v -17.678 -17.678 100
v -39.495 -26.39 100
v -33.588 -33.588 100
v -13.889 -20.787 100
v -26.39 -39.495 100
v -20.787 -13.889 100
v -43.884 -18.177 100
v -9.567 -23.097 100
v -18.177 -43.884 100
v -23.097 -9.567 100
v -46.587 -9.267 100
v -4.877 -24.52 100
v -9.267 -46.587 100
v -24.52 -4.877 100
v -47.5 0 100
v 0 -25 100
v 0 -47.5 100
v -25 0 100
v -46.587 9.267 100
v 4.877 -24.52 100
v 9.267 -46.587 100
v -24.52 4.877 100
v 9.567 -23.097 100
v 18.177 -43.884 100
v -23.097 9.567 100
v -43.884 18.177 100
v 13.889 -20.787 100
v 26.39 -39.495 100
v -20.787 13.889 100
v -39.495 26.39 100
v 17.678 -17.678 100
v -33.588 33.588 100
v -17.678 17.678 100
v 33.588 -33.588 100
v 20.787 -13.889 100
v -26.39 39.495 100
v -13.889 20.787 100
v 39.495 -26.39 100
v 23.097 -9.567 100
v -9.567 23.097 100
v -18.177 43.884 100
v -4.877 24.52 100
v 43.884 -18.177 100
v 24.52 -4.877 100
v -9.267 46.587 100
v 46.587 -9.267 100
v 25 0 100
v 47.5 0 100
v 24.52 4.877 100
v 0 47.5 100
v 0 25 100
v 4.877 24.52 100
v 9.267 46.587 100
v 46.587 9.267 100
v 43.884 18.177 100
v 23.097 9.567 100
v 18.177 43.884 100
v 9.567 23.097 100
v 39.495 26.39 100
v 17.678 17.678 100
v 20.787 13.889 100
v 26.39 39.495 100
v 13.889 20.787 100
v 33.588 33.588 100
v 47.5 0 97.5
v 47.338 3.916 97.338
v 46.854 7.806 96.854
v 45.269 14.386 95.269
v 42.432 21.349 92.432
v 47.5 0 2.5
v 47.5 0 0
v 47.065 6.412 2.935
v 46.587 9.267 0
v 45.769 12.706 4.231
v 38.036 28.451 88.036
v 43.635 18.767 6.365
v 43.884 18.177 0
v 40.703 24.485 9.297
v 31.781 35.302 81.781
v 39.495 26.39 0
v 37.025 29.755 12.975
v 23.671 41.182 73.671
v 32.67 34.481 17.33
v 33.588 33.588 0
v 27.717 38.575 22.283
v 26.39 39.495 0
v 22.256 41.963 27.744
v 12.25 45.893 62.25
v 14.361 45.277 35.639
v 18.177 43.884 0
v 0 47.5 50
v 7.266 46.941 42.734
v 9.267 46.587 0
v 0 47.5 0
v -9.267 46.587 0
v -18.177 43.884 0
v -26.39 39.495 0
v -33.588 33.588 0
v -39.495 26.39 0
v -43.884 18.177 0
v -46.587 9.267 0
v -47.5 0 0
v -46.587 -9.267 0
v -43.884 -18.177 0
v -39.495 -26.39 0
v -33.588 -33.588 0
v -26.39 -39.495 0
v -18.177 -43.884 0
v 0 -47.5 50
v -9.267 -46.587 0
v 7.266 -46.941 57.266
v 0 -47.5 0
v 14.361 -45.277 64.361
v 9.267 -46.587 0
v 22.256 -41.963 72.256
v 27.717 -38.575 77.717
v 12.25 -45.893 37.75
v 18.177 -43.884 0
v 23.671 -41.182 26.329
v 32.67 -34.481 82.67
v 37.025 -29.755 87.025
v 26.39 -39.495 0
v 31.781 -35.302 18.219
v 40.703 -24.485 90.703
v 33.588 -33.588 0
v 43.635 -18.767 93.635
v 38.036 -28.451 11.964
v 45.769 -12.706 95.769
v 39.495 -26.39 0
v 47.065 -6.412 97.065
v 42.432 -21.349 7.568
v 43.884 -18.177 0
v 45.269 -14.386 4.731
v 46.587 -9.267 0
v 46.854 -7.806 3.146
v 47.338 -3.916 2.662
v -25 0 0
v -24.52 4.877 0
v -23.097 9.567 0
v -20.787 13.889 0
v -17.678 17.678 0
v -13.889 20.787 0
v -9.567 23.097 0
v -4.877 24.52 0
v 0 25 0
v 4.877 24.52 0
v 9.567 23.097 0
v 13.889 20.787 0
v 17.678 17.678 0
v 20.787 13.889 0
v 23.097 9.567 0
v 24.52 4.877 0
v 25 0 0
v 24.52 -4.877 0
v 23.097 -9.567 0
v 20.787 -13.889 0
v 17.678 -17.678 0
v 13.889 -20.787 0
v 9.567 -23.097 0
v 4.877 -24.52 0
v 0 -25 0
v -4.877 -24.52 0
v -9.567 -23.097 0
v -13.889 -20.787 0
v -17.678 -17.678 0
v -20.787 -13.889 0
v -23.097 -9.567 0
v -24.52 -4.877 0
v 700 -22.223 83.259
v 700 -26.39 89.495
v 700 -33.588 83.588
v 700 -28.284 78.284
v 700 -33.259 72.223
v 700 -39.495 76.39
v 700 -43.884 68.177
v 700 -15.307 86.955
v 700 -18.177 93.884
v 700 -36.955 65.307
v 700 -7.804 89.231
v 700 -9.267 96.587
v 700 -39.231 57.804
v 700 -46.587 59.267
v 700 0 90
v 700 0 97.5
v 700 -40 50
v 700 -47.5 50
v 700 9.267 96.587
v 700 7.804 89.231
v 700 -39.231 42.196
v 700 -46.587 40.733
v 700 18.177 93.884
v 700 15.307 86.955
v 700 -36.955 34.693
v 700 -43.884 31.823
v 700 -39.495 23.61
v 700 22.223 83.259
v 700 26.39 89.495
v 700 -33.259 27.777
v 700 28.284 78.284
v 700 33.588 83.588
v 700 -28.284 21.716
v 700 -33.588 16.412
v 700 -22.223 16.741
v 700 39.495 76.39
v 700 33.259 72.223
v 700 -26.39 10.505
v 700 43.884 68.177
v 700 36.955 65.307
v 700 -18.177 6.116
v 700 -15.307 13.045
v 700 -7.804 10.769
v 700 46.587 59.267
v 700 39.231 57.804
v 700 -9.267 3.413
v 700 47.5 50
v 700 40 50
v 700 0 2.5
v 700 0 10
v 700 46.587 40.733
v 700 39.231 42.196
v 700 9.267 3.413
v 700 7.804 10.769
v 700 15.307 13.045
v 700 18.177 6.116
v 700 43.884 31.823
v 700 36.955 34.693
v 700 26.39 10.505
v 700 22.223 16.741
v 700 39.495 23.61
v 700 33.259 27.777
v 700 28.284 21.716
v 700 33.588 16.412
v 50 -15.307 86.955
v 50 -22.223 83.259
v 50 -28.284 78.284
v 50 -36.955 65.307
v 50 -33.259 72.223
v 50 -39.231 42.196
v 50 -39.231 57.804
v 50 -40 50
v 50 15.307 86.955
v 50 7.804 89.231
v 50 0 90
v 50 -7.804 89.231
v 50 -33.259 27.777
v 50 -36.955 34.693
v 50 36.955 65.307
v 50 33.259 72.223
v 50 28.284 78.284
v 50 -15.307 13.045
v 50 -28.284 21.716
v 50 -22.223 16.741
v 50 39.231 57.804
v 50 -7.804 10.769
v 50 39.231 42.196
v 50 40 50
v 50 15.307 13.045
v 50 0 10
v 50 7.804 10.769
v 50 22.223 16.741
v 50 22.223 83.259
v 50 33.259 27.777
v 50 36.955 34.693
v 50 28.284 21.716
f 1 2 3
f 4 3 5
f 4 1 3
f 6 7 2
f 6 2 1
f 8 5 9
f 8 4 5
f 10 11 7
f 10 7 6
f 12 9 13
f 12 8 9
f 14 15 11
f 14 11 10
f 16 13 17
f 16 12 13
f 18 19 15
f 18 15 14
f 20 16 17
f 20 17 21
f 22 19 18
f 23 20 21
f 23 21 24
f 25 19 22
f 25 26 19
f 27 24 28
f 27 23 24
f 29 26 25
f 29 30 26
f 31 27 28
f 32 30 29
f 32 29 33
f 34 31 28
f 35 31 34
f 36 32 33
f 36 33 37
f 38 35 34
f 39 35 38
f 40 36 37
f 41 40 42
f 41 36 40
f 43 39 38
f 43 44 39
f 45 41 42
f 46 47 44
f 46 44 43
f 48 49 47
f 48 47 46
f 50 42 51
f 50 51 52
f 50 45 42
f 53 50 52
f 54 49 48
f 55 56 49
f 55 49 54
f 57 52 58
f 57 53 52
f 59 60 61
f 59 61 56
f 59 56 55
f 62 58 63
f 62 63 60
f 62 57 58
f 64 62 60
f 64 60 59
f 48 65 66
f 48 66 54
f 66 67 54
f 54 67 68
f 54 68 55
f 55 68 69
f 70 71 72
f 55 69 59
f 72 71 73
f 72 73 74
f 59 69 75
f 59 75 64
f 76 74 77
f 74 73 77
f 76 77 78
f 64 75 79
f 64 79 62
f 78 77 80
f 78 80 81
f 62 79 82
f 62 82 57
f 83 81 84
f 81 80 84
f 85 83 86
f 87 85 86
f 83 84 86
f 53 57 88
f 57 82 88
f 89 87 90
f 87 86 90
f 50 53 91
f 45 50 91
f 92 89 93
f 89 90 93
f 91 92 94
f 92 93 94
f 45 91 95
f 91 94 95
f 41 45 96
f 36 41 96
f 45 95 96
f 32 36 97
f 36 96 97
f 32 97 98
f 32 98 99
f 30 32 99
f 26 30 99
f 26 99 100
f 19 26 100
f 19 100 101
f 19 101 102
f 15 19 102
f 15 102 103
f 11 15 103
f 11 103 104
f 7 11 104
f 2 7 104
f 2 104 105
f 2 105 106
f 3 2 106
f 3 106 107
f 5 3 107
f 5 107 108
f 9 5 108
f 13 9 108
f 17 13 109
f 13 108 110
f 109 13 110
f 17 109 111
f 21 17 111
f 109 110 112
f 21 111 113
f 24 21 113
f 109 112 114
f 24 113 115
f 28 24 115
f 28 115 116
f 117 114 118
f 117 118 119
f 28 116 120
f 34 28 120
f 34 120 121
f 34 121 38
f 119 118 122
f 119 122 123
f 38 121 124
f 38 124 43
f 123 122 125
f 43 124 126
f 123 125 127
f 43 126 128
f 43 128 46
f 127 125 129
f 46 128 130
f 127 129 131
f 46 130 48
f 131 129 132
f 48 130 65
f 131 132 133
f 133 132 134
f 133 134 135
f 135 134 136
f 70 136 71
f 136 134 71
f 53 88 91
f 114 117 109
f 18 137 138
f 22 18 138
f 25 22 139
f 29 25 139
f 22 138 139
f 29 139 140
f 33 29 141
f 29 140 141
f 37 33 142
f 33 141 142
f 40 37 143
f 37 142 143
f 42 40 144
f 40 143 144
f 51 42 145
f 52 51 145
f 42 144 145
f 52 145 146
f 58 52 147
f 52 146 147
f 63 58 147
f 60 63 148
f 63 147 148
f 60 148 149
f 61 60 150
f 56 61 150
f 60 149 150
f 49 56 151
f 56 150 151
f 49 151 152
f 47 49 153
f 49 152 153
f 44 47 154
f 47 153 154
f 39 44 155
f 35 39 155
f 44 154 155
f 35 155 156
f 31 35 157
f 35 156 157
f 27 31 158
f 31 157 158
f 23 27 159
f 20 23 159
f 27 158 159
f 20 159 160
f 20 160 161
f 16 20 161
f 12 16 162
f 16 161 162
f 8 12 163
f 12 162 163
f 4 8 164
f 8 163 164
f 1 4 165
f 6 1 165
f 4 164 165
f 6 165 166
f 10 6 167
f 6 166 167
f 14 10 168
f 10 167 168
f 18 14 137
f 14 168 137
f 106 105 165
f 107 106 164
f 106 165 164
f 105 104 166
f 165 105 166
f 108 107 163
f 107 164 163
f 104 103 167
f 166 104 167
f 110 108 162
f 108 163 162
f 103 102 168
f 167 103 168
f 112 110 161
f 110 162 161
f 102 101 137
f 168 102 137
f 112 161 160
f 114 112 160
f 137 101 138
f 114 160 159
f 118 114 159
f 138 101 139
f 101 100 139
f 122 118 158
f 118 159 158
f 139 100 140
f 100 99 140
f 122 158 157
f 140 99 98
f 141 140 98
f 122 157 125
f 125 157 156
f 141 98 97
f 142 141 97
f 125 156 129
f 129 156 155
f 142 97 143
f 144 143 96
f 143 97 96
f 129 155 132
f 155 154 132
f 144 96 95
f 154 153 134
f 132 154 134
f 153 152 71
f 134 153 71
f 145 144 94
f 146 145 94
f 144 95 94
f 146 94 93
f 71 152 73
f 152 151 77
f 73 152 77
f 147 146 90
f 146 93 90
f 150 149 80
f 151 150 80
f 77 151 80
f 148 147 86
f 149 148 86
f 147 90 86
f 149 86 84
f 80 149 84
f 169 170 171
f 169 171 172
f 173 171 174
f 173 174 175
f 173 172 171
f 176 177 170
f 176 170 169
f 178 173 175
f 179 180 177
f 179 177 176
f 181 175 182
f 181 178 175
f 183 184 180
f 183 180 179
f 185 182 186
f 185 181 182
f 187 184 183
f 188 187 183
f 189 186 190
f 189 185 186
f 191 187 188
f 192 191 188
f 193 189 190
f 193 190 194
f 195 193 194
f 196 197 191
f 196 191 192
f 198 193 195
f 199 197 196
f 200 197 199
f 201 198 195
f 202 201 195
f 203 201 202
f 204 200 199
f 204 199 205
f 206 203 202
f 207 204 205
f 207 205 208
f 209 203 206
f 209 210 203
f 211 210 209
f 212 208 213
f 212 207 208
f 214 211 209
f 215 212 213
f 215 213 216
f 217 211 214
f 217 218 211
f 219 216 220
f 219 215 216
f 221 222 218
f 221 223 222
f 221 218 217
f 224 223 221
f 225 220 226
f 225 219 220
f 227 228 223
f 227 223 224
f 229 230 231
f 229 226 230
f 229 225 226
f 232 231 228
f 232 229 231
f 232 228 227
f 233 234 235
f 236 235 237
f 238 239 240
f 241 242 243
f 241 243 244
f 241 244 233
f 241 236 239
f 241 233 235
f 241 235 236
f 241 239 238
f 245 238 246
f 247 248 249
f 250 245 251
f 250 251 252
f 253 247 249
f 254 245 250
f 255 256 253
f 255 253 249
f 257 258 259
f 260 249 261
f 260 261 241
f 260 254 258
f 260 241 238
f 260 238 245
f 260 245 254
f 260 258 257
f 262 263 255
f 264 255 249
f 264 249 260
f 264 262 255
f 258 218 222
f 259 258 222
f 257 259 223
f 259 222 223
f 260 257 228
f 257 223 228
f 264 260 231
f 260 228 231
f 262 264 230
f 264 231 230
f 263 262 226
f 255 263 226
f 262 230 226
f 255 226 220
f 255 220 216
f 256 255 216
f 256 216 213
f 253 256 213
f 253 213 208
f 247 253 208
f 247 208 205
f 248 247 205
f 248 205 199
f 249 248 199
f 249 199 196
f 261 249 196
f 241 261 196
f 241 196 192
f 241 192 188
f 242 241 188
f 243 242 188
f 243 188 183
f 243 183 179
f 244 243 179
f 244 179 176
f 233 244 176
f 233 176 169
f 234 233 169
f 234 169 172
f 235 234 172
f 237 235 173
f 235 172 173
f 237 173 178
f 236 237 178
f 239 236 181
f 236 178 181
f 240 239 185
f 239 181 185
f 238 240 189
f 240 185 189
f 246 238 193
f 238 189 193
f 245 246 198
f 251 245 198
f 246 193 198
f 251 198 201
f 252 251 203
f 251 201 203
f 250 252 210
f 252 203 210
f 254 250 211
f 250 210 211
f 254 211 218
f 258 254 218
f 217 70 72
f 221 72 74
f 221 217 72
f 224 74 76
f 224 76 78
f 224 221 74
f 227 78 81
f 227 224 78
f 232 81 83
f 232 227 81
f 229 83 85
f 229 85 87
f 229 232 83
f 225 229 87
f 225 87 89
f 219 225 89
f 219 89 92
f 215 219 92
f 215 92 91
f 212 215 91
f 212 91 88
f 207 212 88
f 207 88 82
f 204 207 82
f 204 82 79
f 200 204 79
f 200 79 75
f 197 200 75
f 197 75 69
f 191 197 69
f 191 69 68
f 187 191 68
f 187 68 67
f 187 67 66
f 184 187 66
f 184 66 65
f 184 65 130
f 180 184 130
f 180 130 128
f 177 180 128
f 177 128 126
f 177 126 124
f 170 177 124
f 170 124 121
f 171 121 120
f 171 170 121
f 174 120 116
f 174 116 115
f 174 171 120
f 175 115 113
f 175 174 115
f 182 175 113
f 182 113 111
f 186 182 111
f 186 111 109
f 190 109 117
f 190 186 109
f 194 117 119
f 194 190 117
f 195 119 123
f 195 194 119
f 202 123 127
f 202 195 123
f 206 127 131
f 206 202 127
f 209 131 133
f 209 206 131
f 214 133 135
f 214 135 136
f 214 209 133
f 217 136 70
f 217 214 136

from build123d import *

# Parameters (mm, degrees)
SKETCH1_R                = 47.5
BOSS_EXTRUDE1_DEPTH      = 100
BOSS_EXTRUDE2_REACH      = 757.654
BOSS_EXTRUDE2_END_RADIUS = 47.5
SKETCH2_R                = 47.5
SKETCH2_R_2              = 40
BOSS_EXTRUDE4_REACH      = 661.36
SKETCH3_R                = 40
SKETCH4_R                = 25
CUT_EXTRUDE1_DEPTH       = 100


with BuildPart() as part:
    # Sketch1 → Boss-Extrude1 (new body)
    with BuildSketch(Plane.XY):
        Circle(SKETCH1_R)
    extrude(amount=BOSS_EXTRUDE1_DEPTH)

    # Boss-Extrude2: up to this cylinder (the profile starts outside it)
    boss_extrude2_end = Plane(origin=(0, 0, 96.156497), z_dir=(0, 0, -1)) * Cylinder(BOSS_EXTRUDE2_END_RADIUS, 1611.308, mode=Mode.PRIVATE)
    # Sketch2 → Boss-Extrude2 (add, up to the surface)
    with BuildSketch(Plane(origin=(700, 0, 0), x_dir=(0, 0, -1), z_dir=(1, 0, 0)), mode=Mode.PRIVATE) as boss_extrude2_sk1:
        with Locations((-50, 0)):
            Circle(SKETCH2_R)
        with Locations((-50, 0)):
            Circle(SKETCH2_R_2, mode=Mode.SUBTRACT)
    boss_extrude2_tool1 = extrude(boss_extrude2_sk1.sketch, amount=-BOSS_EXTRUDE2_REACH, mode=Mode.PRIVATE) - boss_extrude2_end
    add(boss_extrude2_tool1.solids().sort_by_distance((700, 0, 96.156497))[0])

    # Sketch3 → Boss-Extrude4 (add, up to next)
    with BuildSketch(Plane(origin=(50, 0, 0), x_dir=(0, 0, -1), z_dir=(1, 0, 0)), mode=Mode.PRIVATE) as boss_extrude4_sk1:
        with Locations((-50, 0)):
            Circle(SKETCH3_R)
    boss_extrude4_tool1 = extrude(boss_extrude4_sk1.sketch, amount=-BOSS_EXTRUDE4_REACH, mode=Mode.PRIVATE) - part.part
    add(boss_extrude4_tool1.solids().sort_by_distance((50, 0, 50))[0])

    # Sketch4 → Cut-Extrude1 (cut)
    with BuildSketch(Plane(origin=(0, 0, 0), x_dir=(-1, 0, 0), z_dir=(0, 0, -1))):
        Circle(SKETCH4_R)
    extrude(amount=-CUT_EXTRUDE1_DEPTH, mode=Mode.SUBTRACT)


solid = part.part
